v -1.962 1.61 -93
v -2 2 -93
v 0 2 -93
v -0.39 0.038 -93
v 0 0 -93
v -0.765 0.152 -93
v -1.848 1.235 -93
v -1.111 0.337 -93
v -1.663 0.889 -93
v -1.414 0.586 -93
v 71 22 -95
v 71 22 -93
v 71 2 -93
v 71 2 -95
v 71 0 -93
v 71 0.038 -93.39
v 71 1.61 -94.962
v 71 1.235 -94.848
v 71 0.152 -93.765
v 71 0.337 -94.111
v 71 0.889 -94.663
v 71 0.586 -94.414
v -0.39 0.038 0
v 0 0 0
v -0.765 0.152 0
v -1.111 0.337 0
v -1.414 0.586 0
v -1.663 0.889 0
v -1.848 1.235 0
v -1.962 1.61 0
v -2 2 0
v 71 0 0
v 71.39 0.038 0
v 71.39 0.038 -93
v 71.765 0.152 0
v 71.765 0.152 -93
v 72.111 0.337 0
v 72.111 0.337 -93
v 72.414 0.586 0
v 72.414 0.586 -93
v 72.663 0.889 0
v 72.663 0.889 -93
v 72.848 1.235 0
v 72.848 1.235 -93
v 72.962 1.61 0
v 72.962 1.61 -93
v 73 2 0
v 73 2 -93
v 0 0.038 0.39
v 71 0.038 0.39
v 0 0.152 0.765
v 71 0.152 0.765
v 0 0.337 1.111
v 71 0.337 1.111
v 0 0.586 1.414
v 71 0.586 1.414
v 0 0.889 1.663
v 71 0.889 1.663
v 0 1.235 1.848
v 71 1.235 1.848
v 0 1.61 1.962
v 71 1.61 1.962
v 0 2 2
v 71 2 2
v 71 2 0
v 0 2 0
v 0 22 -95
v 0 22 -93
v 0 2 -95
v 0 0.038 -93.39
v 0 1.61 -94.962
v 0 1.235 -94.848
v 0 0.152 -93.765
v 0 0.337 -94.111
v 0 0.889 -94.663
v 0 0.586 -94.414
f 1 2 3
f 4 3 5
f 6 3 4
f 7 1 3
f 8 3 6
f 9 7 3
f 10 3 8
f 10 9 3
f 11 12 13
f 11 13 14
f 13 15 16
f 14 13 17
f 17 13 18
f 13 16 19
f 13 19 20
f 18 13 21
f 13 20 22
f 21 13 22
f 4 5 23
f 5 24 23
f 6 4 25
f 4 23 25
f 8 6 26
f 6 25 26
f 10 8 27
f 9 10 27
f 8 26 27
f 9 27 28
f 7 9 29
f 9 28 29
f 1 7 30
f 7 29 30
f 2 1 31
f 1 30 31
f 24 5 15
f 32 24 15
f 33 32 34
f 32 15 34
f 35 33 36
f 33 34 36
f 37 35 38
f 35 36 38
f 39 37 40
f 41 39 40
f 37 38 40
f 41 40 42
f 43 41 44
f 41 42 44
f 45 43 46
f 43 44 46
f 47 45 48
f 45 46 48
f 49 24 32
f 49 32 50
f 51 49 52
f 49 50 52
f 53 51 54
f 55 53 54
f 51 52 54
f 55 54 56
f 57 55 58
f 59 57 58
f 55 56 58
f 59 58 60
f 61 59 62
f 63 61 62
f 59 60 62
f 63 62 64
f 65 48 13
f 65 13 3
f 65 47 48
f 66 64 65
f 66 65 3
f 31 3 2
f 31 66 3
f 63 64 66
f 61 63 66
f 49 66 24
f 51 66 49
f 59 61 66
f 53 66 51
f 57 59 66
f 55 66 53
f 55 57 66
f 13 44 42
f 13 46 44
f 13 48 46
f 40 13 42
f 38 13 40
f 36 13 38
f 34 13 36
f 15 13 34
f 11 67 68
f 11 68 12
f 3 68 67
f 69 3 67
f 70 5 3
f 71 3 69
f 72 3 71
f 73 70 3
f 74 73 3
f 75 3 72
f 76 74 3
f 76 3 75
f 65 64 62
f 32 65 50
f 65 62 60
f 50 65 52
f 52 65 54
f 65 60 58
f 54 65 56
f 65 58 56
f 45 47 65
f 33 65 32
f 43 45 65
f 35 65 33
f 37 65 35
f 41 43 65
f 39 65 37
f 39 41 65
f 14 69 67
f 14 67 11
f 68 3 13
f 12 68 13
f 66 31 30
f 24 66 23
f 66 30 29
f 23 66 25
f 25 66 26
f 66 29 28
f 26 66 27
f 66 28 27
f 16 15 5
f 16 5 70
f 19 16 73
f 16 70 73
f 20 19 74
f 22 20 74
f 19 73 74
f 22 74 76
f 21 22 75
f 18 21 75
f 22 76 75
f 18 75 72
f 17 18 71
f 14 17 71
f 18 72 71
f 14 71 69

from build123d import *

# Parameters (mm, degrees)
BOTTOM_SIDE_W       = 71
BOTTOM_SIDE_H       = 93
BOTTOM_EXTR_DEPTH   = 2
X_CORNER_W          = 93
X_CORNER_H          = 2
X_CORNER_REV_ANGLE  = 90
Z_CORNER_W          = 71
Z_CORNER_H          = 2
Z_CORNER_REV_ANGLE  = 90
X0_CORNER_W         = 93
X0_CORNER_H         = 2
X0_CORNER_REV_ANGLE = 90
Z0_CORNER_W         = 71
Z0_CORNER_H         = 2
Z0_CORNER_REV_ANGLE = 90
Z0_SIDE_W           = 71
Z0_SIDE_H           = 2
Z0_EXTR_DEPTH       = 20


with BuildPart() as part:
    # bottom side → bottom extr (new body)
    with BuildSketch(Plane(origin=(0, 0, 0), x_dir=(1, 0, 0), z_dir=(0, 1, 0))):
        with Locations((35.5, 46.5)):
            Rectangle(BOTTOM_SIDE_W, BOTTOM_SIDE_H)
    extrude(amount=BOTTOM_EXTR_DEPTH)

    # X+ corner → X+ corner rev (revolve)
    with BuildSketch(Plane(origin=(71, 0, 0), x_dir=(0, 0, -1), z_dir=(1, 0, 0))):
        with Locations((46.5, 1)):
            Rectangle(X_CORNER_W, X_CORNER_H)
    revolve(axis=Axis((71, 2, 0), (0, 0, 1)), revolution_arc=X_CORNER_REV_ANGLE)

    # Z+ corner → Z+ corner rev (revolve)
    with BuildSketch(Plane.XY):
        with Locations((35.5, 1)):
            Rectangle(Z_CORNER_W, Z_CORNER_H)
    revolve(axis=Axis((0, 2, 0), (-1, 0, 0)), revolution_arc=Z_CORNER_REV_ANGLE)

    # X0 corner → X0 corner rev (revolve)
    with BuildSketch(Plane.ZY):
        with Locations((-46.5, 1)):
            Rectangle(X0_CORNER_W, X0_CORNER_H)
    revolve(axis=Axis((0, 2, -93), (0, 0, -1)), revolution_arc=X0_CORNER_REV_ANGLE)

    # Z0 corner → Z0 corner rev (revolve)
    with BuildSketch(Plane(origin=(0, 0, -93), x_dir=(-1, 0, 0), z_dir=(0, 0, -1))):
        with Locations((-35.5, 1)):
            Rectangle(Z0_CORNER_W, Z0_CORNER_H)
    revolve(axis=Axis((71, 2, -93), (1, 0, 0)), revolution_arc=Z0_CORNER_REV_ANGLE)

    # Z0 side → Z0 extr (add)
    with BuildSketch(Plane(origin=(0, 2, 0), x_dir=(1, 0, 0), z_dir=(0, 1, 0))):
        with Locations((35.5, 94)):
            Rectangle(Z0_SIDE_W, Z0_SIDE_H)
    extrude(amount=Z0_EXTR_DEPTH)


solid = part.part
